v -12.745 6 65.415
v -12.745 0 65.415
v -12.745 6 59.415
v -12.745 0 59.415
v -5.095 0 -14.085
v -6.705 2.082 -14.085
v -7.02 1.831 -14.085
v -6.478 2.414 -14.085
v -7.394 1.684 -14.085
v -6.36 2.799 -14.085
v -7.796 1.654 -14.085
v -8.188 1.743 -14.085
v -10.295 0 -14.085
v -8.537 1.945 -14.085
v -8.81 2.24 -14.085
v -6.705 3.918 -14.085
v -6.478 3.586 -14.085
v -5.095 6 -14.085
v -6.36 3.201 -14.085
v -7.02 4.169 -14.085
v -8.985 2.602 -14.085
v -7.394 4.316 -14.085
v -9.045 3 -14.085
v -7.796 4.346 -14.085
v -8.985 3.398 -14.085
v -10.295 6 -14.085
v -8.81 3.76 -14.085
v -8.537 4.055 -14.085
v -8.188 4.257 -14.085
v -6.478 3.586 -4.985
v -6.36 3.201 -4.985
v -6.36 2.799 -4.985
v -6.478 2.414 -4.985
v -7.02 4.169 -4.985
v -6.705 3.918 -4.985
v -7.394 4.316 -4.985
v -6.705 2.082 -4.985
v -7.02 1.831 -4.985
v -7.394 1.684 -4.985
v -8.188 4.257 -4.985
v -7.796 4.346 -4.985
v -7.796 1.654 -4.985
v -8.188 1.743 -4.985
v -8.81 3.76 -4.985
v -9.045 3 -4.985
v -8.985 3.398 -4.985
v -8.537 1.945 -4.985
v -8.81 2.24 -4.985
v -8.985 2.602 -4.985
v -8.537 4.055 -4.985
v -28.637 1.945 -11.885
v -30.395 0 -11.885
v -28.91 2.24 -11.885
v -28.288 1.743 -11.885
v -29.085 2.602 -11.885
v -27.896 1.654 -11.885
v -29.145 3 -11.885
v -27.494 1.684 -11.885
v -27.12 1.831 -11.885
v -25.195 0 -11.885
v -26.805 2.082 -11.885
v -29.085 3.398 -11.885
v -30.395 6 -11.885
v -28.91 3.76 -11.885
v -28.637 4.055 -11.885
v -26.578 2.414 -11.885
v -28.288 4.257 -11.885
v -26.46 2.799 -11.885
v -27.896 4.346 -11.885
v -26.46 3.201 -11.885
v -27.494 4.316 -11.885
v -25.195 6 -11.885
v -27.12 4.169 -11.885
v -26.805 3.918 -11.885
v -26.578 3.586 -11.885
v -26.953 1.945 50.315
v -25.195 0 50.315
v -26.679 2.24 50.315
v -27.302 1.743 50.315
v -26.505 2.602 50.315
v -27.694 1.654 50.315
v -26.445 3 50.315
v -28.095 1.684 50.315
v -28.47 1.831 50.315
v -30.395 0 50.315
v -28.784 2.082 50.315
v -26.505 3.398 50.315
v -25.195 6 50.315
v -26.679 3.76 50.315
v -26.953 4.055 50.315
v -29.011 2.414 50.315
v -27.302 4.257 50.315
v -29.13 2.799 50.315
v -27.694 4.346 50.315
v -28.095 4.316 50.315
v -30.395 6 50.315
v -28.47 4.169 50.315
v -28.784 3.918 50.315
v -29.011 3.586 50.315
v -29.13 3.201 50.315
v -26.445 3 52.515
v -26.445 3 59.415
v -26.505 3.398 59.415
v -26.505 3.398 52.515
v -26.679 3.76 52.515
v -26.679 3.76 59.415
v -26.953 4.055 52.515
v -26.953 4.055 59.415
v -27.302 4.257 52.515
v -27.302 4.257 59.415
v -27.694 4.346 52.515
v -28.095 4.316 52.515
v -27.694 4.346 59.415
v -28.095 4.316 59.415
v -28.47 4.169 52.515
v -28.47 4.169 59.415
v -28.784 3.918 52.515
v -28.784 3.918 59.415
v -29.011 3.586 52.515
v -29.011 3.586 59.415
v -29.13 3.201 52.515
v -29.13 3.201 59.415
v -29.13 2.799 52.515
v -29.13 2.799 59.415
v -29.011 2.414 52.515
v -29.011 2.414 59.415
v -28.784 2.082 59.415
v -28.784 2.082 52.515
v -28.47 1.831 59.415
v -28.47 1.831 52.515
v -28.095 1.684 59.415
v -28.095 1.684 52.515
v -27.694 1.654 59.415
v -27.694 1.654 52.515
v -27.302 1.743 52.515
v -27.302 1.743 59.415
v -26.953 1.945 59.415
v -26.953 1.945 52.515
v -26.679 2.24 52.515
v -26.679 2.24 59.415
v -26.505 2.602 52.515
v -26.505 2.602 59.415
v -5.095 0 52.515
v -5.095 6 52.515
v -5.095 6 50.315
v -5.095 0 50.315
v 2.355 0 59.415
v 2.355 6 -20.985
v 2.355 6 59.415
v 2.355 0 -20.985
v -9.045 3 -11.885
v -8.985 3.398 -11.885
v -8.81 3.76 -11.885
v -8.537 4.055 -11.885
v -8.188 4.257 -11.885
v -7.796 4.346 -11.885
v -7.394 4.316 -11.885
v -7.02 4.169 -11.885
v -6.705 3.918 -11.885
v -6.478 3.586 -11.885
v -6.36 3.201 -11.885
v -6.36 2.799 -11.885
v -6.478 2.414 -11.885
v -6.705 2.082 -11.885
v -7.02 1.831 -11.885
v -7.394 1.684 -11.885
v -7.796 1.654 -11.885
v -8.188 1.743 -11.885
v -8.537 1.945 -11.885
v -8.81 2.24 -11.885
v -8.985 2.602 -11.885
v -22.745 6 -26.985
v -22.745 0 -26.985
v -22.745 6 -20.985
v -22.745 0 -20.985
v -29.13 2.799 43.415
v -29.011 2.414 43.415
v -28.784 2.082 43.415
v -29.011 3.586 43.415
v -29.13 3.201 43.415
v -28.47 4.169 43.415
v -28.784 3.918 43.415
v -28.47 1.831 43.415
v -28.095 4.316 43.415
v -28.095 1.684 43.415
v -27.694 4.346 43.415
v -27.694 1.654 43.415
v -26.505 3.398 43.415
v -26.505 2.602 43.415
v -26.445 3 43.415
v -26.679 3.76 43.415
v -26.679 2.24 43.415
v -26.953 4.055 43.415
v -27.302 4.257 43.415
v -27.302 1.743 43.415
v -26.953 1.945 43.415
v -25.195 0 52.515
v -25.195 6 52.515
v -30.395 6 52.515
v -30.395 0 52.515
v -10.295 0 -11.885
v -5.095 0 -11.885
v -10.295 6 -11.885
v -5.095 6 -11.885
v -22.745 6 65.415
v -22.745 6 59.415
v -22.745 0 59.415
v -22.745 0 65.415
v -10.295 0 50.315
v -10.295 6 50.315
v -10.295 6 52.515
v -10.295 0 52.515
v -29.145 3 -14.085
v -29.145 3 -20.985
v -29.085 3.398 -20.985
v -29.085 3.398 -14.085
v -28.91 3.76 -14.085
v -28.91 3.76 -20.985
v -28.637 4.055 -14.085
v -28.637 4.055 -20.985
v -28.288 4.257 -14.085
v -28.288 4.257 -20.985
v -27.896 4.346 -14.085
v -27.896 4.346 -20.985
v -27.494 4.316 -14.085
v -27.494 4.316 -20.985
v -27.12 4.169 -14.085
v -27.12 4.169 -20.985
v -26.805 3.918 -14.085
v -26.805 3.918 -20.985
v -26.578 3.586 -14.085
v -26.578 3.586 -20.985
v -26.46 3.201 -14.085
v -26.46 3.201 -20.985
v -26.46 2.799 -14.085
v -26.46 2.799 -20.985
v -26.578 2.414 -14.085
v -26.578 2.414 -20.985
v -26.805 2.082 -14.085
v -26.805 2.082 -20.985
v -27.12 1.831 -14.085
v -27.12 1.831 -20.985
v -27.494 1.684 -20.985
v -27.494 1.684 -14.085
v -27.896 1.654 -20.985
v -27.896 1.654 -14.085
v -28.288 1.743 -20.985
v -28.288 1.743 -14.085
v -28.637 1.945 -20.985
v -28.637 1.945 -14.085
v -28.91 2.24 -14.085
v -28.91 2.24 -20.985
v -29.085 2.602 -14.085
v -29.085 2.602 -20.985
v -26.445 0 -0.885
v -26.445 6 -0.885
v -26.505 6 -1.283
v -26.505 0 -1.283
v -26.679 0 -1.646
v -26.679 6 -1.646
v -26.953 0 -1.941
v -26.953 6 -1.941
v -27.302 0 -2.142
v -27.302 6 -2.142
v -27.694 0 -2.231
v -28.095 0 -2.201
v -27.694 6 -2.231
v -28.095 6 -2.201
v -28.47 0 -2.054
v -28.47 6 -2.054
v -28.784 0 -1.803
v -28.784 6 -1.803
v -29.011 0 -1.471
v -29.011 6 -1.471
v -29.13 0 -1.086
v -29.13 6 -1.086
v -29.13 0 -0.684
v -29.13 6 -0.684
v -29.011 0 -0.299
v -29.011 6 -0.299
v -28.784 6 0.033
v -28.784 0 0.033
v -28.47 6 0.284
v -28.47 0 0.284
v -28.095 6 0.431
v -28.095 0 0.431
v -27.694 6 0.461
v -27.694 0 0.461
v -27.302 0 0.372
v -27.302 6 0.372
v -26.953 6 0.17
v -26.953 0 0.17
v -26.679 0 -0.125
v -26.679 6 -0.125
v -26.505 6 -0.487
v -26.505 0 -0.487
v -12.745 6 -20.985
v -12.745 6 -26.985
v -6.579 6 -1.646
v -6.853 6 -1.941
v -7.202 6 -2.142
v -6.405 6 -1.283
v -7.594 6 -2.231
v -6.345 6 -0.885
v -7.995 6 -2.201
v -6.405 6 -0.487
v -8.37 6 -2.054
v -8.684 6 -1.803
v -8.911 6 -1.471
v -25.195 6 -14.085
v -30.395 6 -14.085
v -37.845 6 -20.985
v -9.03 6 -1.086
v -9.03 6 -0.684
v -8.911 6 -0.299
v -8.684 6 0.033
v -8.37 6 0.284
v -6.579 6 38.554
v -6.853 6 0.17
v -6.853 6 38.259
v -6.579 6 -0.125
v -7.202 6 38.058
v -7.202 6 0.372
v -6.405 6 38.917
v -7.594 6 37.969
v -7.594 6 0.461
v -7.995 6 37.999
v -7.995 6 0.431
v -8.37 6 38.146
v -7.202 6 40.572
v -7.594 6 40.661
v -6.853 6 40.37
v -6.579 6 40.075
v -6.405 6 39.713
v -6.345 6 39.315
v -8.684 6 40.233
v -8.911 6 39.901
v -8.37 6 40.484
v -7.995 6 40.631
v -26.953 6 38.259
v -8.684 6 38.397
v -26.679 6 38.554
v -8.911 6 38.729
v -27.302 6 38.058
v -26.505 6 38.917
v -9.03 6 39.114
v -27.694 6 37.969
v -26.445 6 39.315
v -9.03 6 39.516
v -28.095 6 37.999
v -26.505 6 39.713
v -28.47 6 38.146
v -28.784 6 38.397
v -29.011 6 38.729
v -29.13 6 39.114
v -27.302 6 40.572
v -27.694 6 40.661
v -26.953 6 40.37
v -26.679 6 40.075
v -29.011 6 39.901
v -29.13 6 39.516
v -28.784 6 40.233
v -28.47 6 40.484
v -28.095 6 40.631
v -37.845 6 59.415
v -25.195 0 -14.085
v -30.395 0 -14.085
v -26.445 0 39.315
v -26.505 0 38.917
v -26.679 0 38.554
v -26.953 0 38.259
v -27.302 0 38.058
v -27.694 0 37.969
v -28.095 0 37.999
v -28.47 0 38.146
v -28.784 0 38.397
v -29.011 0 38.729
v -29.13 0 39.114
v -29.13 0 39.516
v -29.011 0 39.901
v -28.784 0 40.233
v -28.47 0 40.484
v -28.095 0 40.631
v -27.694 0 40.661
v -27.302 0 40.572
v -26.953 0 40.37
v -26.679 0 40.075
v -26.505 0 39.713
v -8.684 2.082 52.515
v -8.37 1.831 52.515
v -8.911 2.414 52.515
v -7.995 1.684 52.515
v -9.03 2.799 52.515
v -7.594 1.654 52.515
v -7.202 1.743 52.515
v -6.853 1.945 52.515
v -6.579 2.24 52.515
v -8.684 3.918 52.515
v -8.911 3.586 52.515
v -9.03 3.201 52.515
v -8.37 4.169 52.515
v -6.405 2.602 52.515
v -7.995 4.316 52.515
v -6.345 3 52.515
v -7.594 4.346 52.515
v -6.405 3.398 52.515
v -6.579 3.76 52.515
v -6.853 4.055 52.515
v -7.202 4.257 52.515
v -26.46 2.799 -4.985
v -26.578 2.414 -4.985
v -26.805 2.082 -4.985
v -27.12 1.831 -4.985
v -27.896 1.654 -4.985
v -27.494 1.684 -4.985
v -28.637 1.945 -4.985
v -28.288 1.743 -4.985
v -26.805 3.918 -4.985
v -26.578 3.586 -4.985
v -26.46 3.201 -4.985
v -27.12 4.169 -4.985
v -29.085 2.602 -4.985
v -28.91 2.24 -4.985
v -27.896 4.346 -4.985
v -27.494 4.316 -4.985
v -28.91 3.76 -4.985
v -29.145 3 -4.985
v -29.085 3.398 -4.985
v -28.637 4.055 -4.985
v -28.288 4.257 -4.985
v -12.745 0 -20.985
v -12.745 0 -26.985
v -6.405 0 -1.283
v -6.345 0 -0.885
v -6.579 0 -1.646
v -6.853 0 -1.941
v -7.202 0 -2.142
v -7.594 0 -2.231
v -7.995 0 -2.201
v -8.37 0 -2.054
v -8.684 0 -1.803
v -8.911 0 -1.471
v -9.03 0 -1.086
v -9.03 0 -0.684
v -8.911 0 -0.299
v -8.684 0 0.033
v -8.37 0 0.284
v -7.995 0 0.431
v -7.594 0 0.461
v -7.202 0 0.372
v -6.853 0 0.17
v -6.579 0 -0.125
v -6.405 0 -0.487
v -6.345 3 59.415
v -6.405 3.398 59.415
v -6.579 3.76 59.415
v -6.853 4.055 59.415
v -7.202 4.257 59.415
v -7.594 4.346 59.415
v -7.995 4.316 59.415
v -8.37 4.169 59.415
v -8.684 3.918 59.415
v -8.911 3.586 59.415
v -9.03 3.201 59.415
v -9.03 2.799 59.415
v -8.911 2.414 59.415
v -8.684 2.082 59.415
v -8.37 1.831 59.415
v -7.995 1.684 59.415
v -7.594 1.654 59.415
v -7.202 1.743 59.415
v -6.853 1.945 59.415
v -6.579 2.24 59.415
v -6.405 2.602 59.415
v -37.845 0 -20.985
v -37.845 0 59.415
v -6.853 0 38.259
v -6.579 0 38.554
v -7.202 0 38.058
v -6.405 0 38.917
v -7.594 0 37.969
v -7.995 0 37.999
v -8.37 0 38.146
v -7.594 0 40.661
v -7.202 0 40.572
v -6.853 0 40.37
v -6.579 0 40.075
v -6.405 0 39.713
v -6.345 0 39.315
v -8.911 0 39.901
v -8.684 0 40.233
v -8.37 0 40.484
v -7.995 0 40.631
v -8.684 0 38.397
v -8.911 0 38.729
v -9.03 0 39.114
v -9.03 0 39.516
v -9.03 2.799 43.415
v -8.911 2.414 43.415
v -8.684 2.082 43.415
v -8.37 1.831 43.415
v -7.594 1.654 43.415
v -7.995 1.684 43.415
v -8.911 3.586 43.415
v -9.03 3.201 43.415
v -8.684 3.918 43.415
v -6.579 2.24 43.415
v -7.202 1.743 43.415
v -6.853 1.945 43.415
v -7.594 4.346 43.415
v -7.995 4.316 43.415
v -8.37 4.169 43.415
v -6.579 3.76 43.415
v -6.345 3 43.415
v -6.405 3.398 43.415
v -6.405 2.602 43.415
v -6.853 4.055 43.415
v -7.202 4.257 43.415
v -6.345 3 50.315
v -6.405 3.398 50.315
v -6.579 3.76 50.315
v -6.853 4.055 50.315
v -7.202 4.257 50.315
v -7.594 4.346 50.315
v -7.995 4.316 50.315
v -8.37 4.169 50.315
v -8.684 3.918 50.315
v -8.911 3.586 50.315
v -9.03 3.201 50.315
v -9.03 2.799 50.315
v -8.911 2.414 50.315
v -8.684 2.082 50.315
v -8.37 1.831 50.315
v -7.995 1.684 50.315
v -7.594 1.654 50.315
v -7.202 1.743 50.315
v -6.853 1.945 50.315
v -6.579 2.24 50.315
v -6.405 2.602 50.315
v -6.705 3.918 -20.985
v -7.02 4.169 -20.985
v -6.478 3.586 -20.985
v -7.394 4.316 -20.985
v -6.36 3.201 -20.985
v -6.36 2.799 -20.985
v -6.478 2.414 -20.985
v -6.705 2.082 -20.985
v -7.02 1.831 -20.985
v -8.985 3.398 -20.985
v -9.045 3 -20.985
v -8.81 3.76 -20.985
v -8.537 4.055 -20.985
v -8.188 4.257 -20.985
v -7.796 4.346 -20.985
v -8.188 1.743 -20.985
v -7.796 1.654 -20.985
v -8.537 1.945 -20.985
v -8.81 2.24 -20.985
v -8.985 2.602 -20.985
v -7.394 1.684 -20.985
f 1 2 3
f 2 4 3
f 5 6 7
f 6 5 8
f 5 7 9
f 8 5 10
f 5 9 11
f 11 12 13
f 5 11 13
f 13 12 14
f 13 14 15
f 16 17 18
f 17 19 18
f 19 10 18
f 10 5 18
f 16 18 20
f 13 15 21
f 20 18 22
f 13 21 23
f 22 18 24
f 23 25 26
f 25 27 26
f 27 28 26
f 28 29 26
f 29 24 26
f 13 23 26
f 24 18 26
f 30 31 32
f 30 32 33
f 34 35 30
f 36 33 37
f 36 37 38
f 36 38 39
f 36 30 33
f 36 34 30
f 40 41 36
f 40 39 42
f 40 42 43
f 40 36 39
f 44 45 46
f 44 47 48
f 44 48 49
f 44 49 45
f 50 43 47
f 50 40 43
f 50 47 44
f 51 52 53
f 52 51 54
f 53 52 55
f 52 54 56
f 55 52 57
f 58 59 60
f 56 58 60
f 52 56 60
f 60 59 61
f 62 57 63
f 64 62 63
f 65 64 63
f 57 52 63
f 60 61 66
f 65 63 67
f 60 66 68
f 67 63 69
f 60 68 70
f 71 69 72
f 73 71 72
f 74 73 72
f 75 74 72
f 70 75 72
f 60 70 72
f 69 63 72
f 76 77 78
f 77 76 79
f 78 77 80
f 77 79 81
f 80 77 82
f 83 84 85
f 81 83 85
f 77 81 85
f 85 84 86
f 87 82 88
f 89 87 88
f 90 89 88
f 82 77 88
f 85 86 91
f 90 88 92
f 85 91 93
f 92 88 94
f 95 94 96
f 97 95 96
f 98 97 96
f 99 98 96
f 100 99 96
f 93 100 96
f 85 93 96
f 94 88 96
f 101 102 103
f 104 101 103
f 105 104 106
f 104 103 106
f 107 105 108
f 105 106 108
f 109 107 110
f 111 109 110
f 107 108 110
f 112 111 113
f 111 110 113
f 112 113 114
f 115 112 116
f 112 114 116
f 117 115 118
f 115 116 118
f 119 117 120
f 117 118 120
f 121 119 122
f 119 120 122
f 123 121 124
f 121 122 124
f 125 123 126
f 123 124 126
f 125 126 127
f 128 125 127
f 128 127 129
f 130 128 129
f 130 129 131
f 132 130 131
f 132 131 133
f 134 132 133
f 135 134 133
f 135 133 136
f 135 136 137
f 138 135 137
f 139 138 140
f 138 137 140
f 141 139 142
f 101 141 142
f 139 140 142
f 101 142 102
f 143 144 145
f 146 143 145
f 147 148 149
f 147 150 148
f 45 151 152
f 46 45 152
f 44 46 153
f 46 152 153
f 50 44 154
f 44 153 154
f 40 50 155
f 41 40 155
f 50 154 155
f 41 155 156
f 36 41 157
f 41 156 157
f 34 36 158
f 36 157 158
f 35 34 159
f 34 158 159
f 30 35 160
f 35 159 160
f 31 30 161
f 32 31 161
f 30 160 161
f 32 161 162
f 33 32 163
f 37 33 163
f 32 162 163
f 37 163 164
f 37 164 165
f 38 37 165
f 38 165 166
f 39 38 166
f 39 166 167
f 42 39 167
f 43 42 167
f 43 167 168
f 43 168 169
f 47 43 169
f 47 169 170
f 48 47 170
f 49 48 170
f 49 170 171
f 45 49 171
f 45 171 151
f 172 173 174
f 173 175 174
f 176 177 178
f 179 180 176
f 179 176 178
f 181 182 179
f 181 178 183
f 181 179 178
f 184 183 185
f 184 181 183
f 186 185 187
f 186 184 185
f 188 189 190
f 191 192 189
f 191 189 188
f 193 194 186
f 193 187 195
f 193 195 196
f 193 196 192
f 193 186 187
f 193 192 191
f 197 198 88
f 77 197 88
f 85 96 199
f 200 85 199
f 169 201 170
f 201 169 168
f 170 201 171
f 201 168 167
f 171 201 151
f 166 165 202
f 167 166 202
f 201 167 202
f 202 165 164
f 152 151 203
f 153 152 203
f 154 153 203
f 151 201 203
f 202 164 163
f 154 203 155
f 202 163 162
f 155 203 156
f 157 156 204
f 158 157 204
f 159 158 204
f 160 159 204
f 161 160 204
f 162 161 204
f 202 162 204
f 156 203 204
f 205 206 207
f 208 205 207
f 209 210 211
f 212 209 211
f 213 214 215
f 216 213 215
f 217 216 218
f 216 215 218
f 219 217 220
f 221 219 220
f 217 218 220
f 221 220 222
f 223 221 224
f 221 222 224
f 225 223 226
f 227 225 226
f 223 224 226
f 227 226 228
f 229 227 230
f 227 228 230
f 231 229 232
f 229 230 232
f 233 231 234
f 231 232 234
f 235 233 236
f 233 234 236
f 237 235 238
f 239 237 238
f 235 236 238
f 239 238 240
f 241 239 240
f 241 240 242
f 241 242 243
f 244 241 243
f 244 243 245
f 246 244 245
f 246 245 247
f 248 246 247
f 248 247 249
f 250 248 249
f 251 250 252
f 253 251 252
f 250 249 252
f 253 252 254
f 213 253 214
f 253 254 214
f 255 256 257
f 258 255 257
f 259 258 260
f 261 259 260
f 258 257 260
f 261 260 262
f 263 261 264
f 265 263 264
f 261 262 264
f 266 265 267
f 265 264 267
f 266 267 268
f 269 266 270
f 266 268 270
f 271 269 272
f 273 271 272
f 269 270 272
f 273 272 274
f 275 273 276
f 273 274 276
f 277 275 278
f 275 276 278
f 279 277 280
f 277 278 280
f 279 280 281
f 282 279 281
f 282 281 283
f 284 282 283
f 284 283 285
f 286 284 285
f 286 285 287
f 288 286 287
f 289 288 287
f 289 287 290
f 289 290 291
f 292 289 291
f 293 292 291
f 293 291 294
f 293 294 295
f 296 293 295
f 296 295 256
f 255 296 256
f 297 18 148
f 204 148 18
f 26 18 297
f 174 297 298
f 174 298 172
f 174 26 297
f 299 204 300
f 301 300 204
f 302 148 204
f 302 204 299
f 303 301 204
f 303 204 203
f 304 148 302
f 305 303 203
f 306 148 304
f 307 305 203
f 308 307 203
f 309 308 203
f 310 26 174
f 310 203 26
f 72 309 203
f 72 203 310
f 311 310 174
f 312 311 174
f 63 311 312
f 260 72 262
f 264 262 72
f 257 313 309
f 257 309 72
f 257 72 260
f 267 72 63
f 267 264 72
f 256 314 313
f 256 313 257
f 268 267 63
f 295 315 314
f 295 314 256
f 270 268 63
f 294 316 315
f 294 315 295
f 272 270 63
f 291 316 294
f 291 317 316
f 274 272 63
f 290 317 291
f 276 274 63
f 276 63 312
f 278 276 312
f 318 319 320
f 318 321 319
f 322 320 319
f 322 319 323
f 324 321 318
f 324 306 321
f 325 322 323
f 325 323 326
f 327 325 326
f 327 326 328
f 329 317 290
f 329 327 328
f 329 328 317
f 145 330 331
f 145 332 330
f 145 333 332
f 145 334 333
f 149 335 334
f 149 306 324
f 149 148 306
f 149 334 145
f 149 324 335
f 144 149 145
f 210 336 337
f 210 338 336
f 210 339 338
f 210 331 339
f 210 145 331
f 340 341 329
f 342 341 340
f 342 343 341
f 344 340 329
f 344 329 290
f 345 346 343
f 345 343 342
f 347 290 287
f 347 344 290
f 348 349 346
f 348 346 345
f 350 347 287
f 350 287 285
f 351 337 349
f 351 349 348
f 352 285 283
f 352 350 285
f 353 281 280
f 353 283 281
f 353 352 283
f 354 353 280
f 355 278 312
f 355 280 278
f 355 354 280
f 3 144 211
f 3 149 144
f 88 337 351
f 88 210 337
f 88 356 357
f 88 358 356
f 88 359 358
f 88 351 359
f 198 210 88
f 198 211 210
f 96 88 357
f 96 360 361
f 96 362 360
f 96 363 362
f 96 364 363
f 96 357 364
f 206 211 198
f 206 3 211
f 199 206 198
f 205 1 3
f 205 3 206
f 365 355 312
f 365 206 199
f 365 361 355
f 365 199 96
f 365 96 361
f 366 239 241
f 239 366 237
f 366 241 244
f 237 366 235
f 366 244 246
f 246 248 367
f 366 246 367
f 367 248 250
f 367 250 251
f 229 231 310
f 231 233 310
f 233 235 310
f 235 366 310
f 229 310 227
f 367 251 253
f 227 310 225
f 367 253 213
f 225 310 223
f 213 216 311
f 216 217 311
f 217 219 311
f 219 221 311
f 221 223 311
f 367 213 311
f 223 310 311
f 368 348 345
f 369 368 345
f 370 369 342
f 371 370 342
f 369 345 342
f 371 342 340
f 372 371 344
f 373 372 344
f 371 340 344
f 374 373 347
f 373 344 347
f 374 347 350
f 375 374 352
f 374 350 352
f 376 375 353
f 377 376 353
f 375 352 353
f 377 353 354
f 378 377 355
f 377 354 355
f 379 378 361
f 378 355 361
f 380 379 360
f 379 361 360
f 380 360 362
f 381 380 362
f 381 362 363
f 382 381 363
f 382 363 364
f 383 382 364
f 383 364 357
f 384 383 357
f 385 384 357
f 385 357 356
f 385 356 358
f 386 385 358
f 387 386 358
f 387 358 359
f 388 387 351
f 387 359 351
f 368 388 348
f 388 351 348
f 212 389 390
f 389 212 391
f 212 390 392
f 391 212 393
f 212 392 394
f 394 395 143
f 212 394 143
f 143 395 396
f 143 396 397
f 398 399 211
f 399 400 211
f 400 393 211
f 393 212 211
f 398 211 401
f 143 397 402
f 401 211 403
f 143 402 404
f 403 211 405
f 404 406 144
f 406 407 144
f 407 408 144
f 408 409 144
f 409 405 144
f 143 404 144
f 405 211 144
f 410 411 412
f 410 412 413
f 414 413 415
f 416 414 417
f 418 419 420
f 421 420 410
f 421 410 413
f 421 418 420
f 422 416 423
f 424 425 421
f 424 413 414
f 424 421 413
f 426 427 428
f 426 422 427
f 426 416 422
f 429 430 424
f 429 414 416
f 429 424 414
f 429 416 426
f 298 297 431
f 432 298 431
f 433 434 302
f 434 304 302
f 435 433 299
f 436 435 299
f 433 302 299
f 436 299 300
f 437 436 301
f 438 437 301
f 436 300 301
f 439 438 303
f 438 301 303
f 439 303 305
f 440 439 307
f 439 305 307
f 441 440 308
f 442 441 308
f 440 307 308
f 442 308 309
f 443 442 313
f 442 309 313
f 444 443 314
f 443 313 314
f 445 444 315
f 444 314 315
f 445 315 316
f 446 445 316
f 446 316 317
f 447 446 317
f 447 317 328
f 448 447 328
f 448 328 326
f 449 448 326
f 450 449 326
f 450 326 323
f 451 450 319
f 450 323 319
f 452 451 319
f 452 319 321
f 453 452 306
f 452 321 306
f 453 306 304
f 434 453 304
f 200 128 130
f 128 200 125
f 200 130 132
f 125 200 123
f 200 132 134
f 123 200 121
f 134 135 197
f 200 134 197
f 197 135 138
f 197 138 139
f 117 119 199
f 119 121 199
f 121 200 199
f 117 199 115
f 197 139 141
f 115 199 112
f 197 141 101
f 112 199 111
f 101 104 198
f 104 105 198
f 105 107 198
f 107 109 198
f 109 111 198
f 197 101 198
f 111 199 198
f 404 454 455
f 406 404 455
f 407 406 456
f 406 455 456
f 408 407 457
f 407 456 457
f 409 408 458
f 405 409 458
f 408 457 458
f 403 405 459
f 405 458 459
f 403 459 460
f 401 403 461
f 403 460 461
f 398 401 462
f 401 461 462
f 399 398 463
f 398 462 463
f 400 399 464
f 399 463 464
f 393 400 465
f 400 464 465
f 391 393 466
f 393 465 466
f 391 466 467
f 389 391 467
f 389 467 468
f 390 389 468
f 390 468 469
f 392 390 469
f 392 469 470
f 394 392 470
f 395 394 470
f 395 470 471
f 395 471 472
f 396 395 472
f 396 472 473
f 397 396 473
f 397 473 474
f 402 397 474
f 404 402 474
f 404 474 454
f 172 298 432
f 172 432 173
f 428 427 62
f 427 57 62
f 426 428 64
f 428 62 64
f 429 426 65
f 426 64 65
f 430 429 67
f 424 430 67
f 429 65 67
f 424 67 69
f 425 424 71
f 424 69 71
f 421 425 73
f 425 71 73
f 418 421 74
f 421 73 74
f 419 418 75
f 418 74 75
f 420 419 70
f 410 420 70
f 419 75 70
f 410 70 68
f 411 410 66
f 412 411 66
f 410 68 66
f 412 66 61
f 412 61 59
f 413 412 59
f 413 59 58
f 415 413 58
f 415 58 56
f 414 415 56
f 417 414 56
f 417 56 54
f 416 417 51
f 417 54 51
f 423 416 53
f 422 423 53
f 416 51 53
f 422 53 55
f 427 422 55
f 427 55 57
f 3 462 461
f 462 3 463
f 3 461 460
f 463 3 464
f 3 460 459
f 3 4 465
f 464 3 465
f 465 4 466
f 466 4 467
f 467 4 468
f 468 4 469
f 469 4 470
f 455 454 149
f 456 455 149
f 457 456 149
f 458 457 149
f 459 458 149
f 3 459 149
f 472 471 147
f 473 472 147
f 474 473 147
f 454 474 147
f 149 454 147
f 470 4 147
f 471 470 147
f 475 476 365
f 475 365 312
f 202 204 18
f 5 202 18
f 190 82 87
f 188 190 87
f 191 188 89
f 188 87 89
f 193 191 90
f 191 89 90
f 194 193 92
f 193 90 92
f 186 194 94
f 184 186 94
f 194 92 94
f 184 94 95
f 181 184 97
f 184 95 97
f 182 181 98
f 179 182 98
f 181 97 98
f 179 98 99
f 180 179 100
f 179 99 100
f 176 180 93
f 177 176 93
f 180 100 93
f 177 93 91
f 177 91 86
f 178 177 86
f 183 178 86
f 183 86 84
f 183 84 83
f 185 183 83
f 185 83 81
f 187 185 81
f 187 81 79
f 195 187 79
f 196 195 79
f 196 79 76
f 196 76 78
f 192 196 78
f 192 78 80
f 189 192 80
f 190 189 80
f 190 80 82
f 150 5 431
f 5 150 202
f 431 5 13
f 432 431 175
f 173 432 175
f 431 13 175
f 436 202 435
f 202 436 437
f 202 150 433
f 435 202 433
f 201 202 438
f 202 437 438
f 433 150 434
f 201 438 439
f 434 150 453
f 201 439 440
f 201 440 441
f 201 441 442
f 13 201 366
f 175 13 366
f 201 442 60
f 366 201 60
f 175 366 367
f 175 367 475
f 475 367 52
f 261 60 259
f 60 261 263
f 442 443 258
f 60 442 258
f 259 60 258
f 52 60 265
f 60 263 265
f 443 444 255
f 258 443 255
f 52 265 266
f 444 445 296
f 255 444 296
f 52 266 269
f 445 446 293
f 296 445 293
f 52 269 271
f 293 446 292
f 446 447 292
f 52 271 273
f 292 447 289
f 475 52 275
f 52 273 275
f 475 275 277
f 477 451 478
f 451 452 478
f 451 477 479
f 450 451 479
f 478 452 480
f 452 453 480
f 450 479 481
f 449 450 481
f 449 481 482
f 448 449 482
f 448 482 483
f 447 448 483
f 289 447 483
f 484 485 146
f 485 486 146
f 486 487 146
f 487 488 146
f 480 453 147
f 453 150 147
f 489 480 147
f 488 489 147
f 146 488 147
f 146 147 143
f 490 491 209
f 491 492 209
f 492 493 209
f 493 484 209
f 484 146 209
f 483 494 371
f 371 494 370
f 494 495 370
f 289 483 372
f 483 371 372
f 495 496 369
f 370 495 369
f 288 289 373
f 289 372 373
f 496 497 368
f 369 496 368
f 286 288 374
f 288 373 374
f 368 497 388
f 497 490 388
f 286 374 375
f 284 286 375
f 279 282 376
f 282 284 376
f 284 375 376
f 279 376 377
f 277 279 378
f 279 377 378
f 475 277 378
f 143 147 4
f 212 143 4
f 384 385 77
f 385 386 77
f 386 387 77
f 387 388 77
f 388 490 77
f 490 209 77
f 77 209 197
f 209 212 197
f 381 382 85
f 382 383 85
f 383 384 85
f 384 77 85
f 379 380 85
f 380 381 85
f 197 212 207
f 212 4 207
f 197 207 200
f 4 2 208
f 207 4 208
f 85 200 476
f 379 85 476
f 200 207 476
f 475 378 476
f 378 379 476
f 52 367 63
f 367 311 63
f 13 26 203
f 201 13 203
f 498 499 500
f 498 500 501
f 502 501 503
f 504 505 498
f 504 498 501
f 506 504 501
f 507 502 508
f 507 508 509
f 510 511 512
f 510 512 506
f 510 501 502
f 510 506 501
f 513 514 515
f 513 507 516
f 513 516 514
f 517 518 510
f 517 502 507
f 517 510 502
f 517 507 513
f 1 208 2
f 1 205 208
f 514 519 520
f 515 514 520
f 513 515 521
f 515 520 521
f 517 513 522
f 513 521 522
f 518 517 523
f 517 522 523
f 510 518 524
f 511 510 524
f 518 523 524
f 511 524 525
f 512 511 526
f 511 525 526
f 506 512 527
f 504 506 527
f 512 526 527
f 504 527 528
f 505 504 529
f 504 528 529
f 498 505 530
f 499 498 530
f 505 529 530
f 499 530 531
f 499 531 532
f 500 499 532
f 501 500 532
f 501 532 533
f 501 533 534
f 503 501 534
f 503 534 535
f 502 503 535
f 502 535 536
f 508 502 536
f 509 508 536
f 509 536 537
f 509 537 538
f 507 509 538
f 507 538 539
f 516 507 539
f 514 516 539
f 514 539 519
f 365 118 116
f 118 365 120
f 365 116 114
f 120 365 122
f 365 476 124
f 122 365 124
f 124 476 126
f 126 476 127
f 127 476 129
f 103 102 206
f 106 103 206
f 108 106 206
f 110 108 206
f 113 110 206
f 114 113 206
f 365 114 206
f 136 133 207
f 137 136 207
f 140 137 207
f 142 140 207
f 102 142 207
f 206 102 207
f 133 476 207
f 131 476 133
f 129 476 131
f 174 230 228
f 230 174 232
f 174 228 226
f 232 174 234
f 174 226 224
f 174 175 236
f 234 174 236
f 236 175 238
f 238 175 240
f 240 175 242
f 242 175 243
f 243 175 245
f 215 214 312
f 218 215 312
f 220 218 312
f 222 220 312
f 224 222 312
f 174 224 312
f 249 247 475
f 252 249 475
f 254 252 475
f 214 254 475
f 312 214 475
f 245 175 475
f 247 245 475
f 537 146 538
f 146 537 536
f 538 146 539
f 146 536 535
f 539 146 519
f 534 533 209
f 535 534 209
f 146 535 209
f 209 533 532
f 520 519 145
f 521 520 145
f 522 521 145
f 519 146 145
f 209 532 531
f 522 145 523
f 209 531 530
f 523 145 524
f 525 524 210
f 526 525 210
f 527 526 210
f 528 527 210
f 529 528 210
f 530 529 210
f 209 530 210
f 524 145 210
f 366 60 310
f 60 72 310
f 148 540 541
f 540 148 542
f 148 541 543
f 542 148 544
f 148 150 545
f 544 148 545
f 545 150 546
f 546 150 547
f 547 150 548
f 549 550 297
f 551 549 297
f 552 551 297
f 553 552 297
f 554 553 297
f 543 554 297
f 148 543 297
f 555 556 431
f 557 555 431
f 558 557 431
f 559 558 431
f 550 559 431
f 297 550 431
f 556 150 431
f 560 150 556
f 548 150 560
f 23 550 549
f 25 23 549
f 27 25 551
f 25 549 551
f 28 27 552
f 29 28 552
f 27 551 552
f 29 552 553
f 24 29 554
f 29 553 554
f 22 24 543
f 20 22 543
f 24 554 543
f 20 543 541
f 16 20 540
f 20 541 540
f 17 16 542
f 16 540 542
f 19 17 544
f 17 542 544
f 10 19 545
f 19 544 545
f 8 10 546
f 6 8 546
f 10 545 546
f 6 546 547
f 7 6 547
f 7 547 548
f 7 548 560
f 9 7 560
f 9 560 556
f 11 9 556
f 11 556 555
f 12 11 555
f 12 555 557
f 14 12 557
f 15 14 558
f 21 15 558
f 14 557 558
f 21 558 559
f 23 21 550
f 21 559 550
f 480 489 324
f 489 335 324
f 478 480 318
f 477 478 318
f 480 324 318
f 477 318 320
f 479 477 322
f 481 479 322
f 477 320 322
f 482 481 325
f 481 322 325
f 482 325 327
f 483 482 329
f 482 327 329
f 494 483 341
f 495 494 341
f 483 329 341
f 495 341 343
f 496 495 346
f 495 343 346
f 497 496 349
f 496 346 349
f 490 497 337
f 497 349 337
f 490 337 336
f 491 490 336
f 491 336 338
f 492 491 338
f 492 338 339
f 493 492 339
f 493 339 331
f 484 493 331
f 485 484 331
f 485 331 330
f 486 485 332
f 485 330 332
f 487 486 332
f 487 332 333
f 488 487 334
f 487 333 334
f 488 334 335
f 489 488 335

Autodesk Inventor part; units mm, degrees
ref_plane "YZ Plane" through (0, 0, 0) normal (1, 0, 0) x (0, 1, 0)
ref_plane "XZ Plane" through (0, 0, 0) normal (0, 1, 0) x (-1, 0, 0)
ref_plane "XY Plane" through (0, 0, 0) normal (0, 0, 1) x (1, 0, 0)
sketch "스케치1" plane through (0, 0, 0) normal (0, 1, 0) x (-1, 0, 0)
  circle A0 centre (7.6948, -23.9851) radius 1.45
  circle A1 centre (27.7948, -23.9851) radius 1.45
  line L0 (-2.3552, -20.9851) -> (37.8448, -20.9851)
  line L1 (-2.3552, -20.9851) -> (-2.3552, -26.9851)
  line L2 (37.8448, -26.9851) -> (-2.3552, -26.9851)
  line L3 (37.8448, -20.9851) -> (37.8448, -26.9851)
  circle A2 centre (27.7948, 62.4149) radius 1.45
  circle A3 centre (7.6948, 62.4149) radius 1.45
  line L4 (37.8448, 65.4149) -> (-2.3552, 65.4149)
  line L5 (-2.3552, 65.4149) -> (-2.3552, 59.4149)
  line L6 (37.8448, 59.4149) -> (-2.3552, 59.4149)
  line L7 (37.8448, 65.4149) -> (37.8448, 59.4149)
  line L8 (37.8448, -20.9851) -> (-2.3552, -20.9851)
  line L9 (-2.3552, -20.9851) -> (-2.3552, 59.4149)
  line L10 (-2.3552, 59.4149) -> (37.8448, 59.4149)
  line L11 (37.8448, 59.4149) -> (37.8448, -20.9851)
  point P0 (0, 0)
extrude "돌출1" add sketch "스케치1" along normal blind 6 contours L9 L6 L11 L0
sketch "스케치2" plane through (0, 6, 0) normal (0, 1, 0) x (1, 0, 0)
  line L0 (2.3552, 20.9851) -> (-37.8448, 20.9851) projected
  line L1 (-37.8448, 20.9851) -> (-37.8448, -59.4149) projected
  line L2 (-37.8448, -59.4149) -> (2.3552, -59.4149) projected
  line L3 (2.3552, -59.4149) -> (2.3552, 20.9851) projected
  line L4 (-47.7448, 30.7851) -> (12.2552, -69.2149) construction
  line L5 (12.2552, 30.7851) -> (-47.7448, -69.2149) construction
  circle A0 centre (-7.6948, -39.3149) radius 1.35
  circle A1 centre (-27.7948, -39.3149) radius 1.35
  circle A2 centre (-7.6948, 0.8851) radius 1.35
  circle A3 centre (-27.7948, 0.8851) radius 1.35
  point P0 (0, 0)
  dimension "d2" = 60
  dimension "d3" = 100
  dimension "d4" = 2.7
  dimension "d5" = 2.7
  dimension "d6" = 2.7
  dimension "d27" = 2.7
extrude "돌출2" cut sketch "스케치2" against normal blind 6 contours A0 | A1 | A2 | A3
sketch "스케치3" plane through (-37.8448, 0, 59.4149) normal (0, 0, 1) x (1, 0, 0)
  line L0 (0, 0) -> (40.2, 0) projected
  line L1 (40.2, 0) -> (40.2, 6) projected
  line L2 (0, 6) -> (40.2, 6) projected
  line L3 (0, 0) -> (0, 6) projected
  line L4 (0, 6) -> (10.05, 6)
  line L5 (10.05, 6) -> (30.15, 6)
  circle A0 centre (10.05, 3) radius 1.35
  circle A1 centre (30.15, 3) radius 1.35
  point P0 (37.8448, 0)
  dimension "d9" = 40.2
  dimension "d10" = 6
  dimension "d11" = 10.05
  dimension "d12" = 20.1
  dimension "d13" = 2.7
  dimension "d14" = 2.7
extrude "돌출3" cut sketch "스케치3" against normal blind 16 contours A0 | A1
sketch "스케치4" plane through (2.3552, 0, -20.9851) normal (0, 0, -1) x (-1, 0, 0)
  circle A0 centre (30.15, 3) radius 1.35 projected
  line L0 (11.4, 6) -> (11.4, 0) projected
  circle A1 centre (10.05, 3) radius 1.35 projected
  point P0 (2.3552, 0)
extrude "돌출4" cut sketch "스케치4" against normal blind 16
sketch "스케치5" plane through (0, 6, 0) normal (0, 1, 0) x (1, 0, 0)
  line L0 (-29.1448, 20.9851) -> (-29.1448, 4.9851) projected
  line L1 (-26.4448, 20.9851) -> (-26.4448, 4.9851) projected
  line L2 (-29.1448, 4.9851) -> (-26.4448, 4.9851) projected
  line L3 (-9.0448, 20.9851) -> (-9.0448, 4.9851) projected
  line L4 (-6.3448, 20.9851) -> (-6.3448, 4.9851) projected
  line L5 (-9.0448, 4.9851) -> (-6.3448, 4.9851) projected
  circle A0 centre (-7.6948, 0.8851) radius 1.35 projected
  circle A1 centre (-27.7948, 0.8851) radius 1.35 projected
  circle A2 centre (-7.6948, -39.3149) radius 1.35 projected
  circle A3 centre (-27.7948, -39.3149) radius 1.35 projected
  line L6 (2.3552, 20.9851) -> (-37.8448, 20.9851) projected
  line L7 (-37.8448, 20.9851) -> (-37.8448, -59.4149) projected
  line L8 (-37.8448, -59.4149) -> (2.3552, -59.4149) projected
  line L9 (2.3552, -59.4149) -> (2.3552, 20.9851) projected
  line L10 (-9.0448, -59.4149) -> (-9.0448, -43.4149) projected
  line L11 (-29.1448, -59.4149) -> (-29.1448, -43.4149) projected
  line L12 (-26.4448, -59.4149) -> (-26.4448, -43.4149) projected
  line L13 (-6.3448, -59.4149) -> (-6.3448, -43.4149) projected
  line L14 (-30.3948, -52.5149) -> (-25.1948, -52.5149)
  line L15 (-25.1948, -52.5149) -> (-25.1948, -50.3149)
  line L16 (-25.1948, -50.3149) -> (-30.3948, -50.3149)
  line L17 (-30.3948, -50.3149) -> (-30.3948, -52.5149)
  line L18 (-30.3948, -52.5149) -> (-25.1948, -50.3149) construction
  line L19 (-25.1948, -52.5149) -> (-30.3948, -50.3149) construction
  line L20 (-10.2948, -52.5149) -> (-5.0948, -52.5149)
  line L21 (-5.0948, -52.5149) -> (-5.0948, -50.3149)
  line L22 (-5.0948, -50.3149) -> (-10.2948, -50.3149)
  line L23 (-10.2948, -50.3149) -> (-10.2948, -52.5149)
  line L24 (-10.2948, -52.5149) -> (-5.0948, -50.3149) construction
  line L25 (-5.0948, -52.5149) -> (-10.2948, -50.3149) construction
  line L26 (-30.3948, 11.8851) -> (-25.1948, 11.8851)
  line L27 (-25.1948, 11.8851) -> (-25.1948, 14.0851)
  line L28 (-25.1948, 14.0851) -> (-30.3948, 14.0851)
  line L29 (-30.3948, 14.0851) -> (-30.3948, 11.8851)
  line L30 (-30.3948, 11.8851) -> (-25.1948, 14.0851) construction
  line L31 (-25.1948, 11.8851) -> (-30.3948, 14.0851) construction
  line L32 (-10.2948, 11.8851) -> (-5.0948, 11.8851)
  line L33 (-5.0948, 11.8851) -> (-5.0948, 14.0851)
  line L34 (-5.0948, 14.0851) -> (-10.2948, 14.0851)
  line L35 (-10.2948, 14.0851) -> (-10.2948, 11.8851)
  line L36 (-10.2948, 11.8851) -> (-5.0948, 14.0851) construction
  line L37 (-5.0948, 11.8851) -> (-10.2948, 14.0851) construction
  point P0 (0, 0)
  point P1 (-27.7948, -51.4149)
  point P2 (-7.6948, -51.4149)
  point P3 (-27.7948, 12.9851)
  point P4 (-7.6948, 12.9851)
  dimension "d34" = 5.2
  dimension "d35" = 2.2
  dimension "d36" = 5.2
  dimension "d37" = 2.2
  dimension "d38" = 5.2
  dimension "d39" = 2.2
  dimension "d40" = 5.2
  dimension "d41" = 2.2
extrude "돌출5" cut sketch "스케치5" against normal blind 6 contours L28 L1 L26 L0 | L0 L26 L29 L28 | L28 L27 L26 L1 | L34 L4 L32 L3 | L3 L32 L35 L34 | L34 L33 L32 L4 | L14 L17 L16 L11 | L11 L16 L12 L14 | L12 L16 L15 L14 | L20 L23 L22 L10 | L10 L22 L13 L20 | L13 L22 L21 L20
sketch "스케치6" plane through (-37.8448, 0, 59.4149) normal (0, 0, 1) x (1, 0, 0)
  circle A0 centre (30.15, 3) radius 1.35 projected
  circle A1 centre (10.05, 3) radius 1.35 projected
  line L0 (0, 0) -> (40.2, 0) projected
  line L1 (40.2, 0) -> (40.2, 6) projected
  line L2 (0, 6) -> (40.2, 6) projected
  line L3 (0, 0) -> (0, 6) projected
  line L4 (15.1, 0) -> (25.1, 0)
  line L5 (25.1, 0) -> (25.1, 6)
  line L6 (25.1, 6) -> (15.1, 6)
  line L7 (15.1, 6) -> (15.1, 0)
  line L8 (15.1, 0) -> (25.1, 6) construction
  line L9 (25.1, 0) -> (15.1, 6) construction
  point P0 (37.8448, 0)
  point P1 (20.1, 3)
  dimension "d28" = 10
extrude "돌출6" add sketch "스케치6" along normal blind 6 contours L7 L2 L5 L0
sketch "스케치7" plane through (2.3552, 0, -20.9851) normal (0, 0, -1) x (-1, 0, 0)
  line L0 (15.1, 6) -> (15.1, 0) projected
  line L1 (25.1, 0) -> (25.1, 6) projected
  circle A0 centre (30.15, 3) radius 1.35 projected
  circle A1 centre (10.05, 3) radius 1.35 projected
  line L2 (0, 0) -> (40.2, 0) projected
  line L3 (40.2, 0) -> (40.2, 6) projected
  line L4 (0, 6) -> (40.2, 6) projected
  line L5 (0, 0) -> (0, 6) projected
  point P0 (2.3552, 0)
extrude "돌출7" add sketch "스케치7" along normal blind 6 contours L4 L1 L2 L0
properties part number "feet_holder3" material "PMMA 플라스틱"
